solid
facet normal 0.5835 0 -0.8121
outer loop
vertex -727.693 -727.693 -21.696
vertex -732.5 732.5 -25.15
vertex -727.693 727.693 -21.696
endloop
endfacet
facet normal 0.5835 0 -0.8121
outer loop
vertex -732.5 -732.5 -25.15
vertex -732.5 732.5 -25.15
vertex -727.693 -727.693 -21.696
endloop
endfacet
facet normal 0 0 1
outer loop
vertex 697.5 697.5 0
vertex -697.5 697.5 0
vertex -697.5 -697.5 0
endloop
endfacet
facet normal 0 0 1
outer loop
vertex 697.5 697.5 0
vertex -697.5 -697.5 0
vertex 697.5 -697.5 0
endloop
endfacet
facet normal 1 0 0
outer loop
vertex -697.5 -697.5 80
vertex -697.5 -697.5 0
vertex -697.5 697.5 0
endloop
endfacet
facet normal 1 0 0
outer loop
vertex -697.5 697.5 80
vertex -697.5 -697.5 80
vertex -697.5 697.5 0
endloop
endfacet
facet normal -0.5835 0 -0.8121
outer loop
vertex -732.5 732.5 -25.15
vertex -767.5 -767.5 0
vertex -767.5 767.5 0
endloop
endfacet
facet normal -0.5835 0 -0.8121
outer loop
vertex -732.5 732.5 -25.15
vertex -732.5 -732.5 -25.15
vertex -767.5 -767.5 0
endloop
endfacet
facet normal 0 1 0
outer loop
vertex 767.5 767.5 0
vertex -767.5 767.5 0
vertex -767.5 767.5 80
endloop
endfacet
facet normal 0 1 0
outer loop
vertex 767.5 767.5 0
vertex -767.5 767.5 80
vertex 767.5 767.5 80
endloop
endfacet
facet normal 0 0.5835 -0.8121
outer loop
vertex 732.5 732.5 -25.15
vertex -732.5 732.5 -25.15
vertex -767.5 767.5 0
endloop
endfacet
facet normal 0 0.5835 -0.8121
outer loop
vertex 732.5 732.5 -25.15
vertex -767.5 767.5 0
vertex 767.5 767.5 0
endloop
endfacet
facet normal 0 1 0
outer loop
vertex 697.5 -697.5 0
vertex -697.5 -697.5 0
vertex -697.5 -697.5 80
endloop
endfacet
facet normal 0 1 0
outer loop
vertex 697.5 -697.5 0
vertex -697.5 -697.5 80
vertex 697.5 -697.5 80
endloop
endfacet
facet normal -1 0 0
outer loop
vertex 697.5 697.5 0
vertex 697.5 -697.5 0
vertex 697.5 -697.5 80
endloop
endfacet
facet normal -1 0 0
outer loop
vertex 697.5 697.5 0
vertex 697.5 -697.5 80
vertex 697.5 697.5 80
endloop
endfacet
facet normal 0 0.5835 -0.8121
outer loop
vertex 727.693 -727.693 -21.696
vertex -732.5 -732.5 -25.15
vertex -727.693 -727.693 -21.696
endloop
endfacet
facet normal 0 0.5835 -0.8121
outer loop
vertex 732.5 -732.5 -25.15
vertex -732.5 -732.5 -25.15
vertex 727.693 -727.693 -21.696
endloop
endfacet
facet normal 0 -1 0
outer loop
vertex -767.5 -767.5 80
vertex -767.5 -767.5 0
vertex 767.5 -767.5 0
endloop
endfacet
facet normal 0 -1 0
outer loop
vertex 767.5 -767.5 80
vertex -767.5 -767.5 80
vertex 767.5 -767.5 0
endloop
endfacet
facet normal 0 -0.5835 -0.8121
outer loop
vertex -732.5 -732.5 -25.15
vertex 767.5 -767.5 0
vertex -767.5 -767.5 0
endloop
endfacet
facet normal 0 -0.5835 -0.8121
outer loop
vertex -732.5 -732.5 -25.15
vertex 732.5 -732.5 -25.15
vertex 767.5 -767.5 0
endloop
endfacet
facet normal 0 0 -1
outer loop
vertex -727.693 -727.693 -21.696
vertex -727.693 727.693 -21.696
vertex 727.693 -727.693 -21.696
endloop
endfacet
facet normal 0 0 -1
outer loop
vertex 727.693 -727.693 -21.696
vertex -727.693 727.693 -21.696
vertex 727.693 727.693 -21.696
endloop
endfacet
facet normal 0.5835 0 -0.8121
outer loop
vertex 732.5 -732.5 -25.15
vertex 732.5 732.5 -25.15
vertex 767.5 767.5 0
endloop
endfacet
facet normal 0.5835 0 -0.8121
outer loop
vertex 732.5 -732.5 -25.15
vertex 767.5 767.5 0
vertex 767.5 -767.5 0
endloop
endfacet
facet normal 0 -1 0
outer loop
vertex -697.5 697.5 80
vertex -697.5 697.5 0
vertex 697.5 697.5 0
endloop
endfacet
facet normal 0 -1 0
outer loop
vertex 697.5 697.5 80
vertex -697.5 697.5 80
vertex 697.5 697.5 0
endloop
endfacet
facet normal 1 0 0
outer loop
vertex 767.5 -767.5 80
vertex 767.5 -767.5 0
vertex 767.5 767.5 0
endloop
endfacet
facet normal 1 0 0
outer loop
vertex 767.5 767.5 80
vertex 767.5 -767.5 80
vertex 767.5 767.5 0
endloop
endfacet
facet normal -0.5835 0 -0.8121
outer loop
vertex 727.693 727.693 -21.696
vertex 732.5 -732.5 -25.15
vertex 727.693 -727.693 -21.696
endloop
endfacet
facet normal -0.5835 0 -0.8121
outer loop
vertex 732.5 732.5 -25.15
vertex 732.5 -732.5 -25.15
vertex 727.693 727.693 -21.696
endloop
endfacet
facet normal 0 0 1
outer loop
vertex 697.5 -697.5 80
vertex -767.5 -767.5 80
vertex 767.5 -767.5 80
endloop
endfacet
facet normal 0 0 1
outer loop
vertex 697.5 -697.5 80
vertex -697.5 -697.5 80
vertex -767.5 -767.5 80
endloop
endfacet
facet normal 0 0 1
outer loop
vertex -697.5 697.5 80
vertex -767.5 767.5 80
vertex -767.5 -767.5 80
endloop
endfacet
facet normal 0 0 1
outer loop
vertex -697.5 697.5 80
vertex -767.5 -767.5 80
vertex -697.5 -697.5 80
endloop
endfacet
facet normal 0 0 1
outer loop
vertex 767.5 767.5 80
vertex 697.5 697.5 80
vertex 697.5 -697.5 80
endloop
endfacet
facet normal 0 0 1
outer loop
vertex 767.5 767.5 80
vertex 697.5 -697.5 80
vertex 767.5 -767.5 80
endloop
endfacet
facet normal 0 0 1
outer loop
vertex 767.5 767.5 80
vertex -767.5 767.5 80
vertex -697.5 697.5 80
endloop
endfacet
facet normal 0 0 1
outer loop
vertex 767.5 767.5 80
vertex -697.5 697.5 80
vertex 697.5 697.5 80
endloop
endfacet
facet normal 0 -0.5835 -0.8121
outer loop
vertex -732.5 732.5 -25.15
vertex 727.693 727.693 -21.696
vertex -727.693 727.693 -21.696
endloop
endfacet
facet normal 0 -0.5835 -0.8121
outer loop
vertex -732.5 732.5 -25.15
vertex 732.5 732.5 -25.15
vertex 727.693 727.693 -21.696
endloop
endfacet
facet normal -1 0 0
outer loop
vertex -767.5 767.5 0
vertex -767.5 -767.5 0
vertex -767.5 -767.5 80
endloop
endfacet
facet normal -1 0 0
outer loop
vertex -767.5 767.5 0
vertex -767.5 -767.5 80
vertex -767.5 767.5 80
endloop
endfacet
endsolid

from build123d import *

# Parameters (mm, degrees)
F0_W        = 1535
F0_H        = 1535
F0_W_2      = 1395
F0_H_2      = 1395
F1_DEPTH    = 80
F1_FACE_W   = 1535
F1_FACE_H   = 1535
F1_FACE_W_2 = 1395
F1_FACE_H_2 = 1395
F2_DEPTH    = 115
F2_TAPER    = 54.3
F3_W        = 1467.787861824
F3_H        = 1458.398938179
F4_DEPTH    = 21.696


with BuildPart() as f1:
    # F0 (on Top) → F1 (new body)
    with BuildSketch(Plane.XY):
        Rectangle(F0_W, F0_H)
        Rectangle(F0_W_2, F0_H_2, mode=Mode.SUBTRACT)
    extrude(amount=F1_DEPTH)

    # F1_face (on face) → F2 (join)
    with BuildSketch(Plane(origin=(0, 0, 0), x_dir=(1, 0, 0), z_dir=(0, 0, -1))):
        Rectangle(F1_FACE_W, F1_FACE_H)
        Rectangle(F1_FACE_W_2, F1_FACE_H_2, mode=Mode.SUBTRACT)
    extrude(amount=F2_DEPTH, taper=F2_TAPER)

    # F3 (on Top) → F4 (join)
    with BuildSketch(Plane.XY):
        Rectangle(F3_W, F3_H)
    extrude(amount=-F4_DEPTH)


solid = f1.part
